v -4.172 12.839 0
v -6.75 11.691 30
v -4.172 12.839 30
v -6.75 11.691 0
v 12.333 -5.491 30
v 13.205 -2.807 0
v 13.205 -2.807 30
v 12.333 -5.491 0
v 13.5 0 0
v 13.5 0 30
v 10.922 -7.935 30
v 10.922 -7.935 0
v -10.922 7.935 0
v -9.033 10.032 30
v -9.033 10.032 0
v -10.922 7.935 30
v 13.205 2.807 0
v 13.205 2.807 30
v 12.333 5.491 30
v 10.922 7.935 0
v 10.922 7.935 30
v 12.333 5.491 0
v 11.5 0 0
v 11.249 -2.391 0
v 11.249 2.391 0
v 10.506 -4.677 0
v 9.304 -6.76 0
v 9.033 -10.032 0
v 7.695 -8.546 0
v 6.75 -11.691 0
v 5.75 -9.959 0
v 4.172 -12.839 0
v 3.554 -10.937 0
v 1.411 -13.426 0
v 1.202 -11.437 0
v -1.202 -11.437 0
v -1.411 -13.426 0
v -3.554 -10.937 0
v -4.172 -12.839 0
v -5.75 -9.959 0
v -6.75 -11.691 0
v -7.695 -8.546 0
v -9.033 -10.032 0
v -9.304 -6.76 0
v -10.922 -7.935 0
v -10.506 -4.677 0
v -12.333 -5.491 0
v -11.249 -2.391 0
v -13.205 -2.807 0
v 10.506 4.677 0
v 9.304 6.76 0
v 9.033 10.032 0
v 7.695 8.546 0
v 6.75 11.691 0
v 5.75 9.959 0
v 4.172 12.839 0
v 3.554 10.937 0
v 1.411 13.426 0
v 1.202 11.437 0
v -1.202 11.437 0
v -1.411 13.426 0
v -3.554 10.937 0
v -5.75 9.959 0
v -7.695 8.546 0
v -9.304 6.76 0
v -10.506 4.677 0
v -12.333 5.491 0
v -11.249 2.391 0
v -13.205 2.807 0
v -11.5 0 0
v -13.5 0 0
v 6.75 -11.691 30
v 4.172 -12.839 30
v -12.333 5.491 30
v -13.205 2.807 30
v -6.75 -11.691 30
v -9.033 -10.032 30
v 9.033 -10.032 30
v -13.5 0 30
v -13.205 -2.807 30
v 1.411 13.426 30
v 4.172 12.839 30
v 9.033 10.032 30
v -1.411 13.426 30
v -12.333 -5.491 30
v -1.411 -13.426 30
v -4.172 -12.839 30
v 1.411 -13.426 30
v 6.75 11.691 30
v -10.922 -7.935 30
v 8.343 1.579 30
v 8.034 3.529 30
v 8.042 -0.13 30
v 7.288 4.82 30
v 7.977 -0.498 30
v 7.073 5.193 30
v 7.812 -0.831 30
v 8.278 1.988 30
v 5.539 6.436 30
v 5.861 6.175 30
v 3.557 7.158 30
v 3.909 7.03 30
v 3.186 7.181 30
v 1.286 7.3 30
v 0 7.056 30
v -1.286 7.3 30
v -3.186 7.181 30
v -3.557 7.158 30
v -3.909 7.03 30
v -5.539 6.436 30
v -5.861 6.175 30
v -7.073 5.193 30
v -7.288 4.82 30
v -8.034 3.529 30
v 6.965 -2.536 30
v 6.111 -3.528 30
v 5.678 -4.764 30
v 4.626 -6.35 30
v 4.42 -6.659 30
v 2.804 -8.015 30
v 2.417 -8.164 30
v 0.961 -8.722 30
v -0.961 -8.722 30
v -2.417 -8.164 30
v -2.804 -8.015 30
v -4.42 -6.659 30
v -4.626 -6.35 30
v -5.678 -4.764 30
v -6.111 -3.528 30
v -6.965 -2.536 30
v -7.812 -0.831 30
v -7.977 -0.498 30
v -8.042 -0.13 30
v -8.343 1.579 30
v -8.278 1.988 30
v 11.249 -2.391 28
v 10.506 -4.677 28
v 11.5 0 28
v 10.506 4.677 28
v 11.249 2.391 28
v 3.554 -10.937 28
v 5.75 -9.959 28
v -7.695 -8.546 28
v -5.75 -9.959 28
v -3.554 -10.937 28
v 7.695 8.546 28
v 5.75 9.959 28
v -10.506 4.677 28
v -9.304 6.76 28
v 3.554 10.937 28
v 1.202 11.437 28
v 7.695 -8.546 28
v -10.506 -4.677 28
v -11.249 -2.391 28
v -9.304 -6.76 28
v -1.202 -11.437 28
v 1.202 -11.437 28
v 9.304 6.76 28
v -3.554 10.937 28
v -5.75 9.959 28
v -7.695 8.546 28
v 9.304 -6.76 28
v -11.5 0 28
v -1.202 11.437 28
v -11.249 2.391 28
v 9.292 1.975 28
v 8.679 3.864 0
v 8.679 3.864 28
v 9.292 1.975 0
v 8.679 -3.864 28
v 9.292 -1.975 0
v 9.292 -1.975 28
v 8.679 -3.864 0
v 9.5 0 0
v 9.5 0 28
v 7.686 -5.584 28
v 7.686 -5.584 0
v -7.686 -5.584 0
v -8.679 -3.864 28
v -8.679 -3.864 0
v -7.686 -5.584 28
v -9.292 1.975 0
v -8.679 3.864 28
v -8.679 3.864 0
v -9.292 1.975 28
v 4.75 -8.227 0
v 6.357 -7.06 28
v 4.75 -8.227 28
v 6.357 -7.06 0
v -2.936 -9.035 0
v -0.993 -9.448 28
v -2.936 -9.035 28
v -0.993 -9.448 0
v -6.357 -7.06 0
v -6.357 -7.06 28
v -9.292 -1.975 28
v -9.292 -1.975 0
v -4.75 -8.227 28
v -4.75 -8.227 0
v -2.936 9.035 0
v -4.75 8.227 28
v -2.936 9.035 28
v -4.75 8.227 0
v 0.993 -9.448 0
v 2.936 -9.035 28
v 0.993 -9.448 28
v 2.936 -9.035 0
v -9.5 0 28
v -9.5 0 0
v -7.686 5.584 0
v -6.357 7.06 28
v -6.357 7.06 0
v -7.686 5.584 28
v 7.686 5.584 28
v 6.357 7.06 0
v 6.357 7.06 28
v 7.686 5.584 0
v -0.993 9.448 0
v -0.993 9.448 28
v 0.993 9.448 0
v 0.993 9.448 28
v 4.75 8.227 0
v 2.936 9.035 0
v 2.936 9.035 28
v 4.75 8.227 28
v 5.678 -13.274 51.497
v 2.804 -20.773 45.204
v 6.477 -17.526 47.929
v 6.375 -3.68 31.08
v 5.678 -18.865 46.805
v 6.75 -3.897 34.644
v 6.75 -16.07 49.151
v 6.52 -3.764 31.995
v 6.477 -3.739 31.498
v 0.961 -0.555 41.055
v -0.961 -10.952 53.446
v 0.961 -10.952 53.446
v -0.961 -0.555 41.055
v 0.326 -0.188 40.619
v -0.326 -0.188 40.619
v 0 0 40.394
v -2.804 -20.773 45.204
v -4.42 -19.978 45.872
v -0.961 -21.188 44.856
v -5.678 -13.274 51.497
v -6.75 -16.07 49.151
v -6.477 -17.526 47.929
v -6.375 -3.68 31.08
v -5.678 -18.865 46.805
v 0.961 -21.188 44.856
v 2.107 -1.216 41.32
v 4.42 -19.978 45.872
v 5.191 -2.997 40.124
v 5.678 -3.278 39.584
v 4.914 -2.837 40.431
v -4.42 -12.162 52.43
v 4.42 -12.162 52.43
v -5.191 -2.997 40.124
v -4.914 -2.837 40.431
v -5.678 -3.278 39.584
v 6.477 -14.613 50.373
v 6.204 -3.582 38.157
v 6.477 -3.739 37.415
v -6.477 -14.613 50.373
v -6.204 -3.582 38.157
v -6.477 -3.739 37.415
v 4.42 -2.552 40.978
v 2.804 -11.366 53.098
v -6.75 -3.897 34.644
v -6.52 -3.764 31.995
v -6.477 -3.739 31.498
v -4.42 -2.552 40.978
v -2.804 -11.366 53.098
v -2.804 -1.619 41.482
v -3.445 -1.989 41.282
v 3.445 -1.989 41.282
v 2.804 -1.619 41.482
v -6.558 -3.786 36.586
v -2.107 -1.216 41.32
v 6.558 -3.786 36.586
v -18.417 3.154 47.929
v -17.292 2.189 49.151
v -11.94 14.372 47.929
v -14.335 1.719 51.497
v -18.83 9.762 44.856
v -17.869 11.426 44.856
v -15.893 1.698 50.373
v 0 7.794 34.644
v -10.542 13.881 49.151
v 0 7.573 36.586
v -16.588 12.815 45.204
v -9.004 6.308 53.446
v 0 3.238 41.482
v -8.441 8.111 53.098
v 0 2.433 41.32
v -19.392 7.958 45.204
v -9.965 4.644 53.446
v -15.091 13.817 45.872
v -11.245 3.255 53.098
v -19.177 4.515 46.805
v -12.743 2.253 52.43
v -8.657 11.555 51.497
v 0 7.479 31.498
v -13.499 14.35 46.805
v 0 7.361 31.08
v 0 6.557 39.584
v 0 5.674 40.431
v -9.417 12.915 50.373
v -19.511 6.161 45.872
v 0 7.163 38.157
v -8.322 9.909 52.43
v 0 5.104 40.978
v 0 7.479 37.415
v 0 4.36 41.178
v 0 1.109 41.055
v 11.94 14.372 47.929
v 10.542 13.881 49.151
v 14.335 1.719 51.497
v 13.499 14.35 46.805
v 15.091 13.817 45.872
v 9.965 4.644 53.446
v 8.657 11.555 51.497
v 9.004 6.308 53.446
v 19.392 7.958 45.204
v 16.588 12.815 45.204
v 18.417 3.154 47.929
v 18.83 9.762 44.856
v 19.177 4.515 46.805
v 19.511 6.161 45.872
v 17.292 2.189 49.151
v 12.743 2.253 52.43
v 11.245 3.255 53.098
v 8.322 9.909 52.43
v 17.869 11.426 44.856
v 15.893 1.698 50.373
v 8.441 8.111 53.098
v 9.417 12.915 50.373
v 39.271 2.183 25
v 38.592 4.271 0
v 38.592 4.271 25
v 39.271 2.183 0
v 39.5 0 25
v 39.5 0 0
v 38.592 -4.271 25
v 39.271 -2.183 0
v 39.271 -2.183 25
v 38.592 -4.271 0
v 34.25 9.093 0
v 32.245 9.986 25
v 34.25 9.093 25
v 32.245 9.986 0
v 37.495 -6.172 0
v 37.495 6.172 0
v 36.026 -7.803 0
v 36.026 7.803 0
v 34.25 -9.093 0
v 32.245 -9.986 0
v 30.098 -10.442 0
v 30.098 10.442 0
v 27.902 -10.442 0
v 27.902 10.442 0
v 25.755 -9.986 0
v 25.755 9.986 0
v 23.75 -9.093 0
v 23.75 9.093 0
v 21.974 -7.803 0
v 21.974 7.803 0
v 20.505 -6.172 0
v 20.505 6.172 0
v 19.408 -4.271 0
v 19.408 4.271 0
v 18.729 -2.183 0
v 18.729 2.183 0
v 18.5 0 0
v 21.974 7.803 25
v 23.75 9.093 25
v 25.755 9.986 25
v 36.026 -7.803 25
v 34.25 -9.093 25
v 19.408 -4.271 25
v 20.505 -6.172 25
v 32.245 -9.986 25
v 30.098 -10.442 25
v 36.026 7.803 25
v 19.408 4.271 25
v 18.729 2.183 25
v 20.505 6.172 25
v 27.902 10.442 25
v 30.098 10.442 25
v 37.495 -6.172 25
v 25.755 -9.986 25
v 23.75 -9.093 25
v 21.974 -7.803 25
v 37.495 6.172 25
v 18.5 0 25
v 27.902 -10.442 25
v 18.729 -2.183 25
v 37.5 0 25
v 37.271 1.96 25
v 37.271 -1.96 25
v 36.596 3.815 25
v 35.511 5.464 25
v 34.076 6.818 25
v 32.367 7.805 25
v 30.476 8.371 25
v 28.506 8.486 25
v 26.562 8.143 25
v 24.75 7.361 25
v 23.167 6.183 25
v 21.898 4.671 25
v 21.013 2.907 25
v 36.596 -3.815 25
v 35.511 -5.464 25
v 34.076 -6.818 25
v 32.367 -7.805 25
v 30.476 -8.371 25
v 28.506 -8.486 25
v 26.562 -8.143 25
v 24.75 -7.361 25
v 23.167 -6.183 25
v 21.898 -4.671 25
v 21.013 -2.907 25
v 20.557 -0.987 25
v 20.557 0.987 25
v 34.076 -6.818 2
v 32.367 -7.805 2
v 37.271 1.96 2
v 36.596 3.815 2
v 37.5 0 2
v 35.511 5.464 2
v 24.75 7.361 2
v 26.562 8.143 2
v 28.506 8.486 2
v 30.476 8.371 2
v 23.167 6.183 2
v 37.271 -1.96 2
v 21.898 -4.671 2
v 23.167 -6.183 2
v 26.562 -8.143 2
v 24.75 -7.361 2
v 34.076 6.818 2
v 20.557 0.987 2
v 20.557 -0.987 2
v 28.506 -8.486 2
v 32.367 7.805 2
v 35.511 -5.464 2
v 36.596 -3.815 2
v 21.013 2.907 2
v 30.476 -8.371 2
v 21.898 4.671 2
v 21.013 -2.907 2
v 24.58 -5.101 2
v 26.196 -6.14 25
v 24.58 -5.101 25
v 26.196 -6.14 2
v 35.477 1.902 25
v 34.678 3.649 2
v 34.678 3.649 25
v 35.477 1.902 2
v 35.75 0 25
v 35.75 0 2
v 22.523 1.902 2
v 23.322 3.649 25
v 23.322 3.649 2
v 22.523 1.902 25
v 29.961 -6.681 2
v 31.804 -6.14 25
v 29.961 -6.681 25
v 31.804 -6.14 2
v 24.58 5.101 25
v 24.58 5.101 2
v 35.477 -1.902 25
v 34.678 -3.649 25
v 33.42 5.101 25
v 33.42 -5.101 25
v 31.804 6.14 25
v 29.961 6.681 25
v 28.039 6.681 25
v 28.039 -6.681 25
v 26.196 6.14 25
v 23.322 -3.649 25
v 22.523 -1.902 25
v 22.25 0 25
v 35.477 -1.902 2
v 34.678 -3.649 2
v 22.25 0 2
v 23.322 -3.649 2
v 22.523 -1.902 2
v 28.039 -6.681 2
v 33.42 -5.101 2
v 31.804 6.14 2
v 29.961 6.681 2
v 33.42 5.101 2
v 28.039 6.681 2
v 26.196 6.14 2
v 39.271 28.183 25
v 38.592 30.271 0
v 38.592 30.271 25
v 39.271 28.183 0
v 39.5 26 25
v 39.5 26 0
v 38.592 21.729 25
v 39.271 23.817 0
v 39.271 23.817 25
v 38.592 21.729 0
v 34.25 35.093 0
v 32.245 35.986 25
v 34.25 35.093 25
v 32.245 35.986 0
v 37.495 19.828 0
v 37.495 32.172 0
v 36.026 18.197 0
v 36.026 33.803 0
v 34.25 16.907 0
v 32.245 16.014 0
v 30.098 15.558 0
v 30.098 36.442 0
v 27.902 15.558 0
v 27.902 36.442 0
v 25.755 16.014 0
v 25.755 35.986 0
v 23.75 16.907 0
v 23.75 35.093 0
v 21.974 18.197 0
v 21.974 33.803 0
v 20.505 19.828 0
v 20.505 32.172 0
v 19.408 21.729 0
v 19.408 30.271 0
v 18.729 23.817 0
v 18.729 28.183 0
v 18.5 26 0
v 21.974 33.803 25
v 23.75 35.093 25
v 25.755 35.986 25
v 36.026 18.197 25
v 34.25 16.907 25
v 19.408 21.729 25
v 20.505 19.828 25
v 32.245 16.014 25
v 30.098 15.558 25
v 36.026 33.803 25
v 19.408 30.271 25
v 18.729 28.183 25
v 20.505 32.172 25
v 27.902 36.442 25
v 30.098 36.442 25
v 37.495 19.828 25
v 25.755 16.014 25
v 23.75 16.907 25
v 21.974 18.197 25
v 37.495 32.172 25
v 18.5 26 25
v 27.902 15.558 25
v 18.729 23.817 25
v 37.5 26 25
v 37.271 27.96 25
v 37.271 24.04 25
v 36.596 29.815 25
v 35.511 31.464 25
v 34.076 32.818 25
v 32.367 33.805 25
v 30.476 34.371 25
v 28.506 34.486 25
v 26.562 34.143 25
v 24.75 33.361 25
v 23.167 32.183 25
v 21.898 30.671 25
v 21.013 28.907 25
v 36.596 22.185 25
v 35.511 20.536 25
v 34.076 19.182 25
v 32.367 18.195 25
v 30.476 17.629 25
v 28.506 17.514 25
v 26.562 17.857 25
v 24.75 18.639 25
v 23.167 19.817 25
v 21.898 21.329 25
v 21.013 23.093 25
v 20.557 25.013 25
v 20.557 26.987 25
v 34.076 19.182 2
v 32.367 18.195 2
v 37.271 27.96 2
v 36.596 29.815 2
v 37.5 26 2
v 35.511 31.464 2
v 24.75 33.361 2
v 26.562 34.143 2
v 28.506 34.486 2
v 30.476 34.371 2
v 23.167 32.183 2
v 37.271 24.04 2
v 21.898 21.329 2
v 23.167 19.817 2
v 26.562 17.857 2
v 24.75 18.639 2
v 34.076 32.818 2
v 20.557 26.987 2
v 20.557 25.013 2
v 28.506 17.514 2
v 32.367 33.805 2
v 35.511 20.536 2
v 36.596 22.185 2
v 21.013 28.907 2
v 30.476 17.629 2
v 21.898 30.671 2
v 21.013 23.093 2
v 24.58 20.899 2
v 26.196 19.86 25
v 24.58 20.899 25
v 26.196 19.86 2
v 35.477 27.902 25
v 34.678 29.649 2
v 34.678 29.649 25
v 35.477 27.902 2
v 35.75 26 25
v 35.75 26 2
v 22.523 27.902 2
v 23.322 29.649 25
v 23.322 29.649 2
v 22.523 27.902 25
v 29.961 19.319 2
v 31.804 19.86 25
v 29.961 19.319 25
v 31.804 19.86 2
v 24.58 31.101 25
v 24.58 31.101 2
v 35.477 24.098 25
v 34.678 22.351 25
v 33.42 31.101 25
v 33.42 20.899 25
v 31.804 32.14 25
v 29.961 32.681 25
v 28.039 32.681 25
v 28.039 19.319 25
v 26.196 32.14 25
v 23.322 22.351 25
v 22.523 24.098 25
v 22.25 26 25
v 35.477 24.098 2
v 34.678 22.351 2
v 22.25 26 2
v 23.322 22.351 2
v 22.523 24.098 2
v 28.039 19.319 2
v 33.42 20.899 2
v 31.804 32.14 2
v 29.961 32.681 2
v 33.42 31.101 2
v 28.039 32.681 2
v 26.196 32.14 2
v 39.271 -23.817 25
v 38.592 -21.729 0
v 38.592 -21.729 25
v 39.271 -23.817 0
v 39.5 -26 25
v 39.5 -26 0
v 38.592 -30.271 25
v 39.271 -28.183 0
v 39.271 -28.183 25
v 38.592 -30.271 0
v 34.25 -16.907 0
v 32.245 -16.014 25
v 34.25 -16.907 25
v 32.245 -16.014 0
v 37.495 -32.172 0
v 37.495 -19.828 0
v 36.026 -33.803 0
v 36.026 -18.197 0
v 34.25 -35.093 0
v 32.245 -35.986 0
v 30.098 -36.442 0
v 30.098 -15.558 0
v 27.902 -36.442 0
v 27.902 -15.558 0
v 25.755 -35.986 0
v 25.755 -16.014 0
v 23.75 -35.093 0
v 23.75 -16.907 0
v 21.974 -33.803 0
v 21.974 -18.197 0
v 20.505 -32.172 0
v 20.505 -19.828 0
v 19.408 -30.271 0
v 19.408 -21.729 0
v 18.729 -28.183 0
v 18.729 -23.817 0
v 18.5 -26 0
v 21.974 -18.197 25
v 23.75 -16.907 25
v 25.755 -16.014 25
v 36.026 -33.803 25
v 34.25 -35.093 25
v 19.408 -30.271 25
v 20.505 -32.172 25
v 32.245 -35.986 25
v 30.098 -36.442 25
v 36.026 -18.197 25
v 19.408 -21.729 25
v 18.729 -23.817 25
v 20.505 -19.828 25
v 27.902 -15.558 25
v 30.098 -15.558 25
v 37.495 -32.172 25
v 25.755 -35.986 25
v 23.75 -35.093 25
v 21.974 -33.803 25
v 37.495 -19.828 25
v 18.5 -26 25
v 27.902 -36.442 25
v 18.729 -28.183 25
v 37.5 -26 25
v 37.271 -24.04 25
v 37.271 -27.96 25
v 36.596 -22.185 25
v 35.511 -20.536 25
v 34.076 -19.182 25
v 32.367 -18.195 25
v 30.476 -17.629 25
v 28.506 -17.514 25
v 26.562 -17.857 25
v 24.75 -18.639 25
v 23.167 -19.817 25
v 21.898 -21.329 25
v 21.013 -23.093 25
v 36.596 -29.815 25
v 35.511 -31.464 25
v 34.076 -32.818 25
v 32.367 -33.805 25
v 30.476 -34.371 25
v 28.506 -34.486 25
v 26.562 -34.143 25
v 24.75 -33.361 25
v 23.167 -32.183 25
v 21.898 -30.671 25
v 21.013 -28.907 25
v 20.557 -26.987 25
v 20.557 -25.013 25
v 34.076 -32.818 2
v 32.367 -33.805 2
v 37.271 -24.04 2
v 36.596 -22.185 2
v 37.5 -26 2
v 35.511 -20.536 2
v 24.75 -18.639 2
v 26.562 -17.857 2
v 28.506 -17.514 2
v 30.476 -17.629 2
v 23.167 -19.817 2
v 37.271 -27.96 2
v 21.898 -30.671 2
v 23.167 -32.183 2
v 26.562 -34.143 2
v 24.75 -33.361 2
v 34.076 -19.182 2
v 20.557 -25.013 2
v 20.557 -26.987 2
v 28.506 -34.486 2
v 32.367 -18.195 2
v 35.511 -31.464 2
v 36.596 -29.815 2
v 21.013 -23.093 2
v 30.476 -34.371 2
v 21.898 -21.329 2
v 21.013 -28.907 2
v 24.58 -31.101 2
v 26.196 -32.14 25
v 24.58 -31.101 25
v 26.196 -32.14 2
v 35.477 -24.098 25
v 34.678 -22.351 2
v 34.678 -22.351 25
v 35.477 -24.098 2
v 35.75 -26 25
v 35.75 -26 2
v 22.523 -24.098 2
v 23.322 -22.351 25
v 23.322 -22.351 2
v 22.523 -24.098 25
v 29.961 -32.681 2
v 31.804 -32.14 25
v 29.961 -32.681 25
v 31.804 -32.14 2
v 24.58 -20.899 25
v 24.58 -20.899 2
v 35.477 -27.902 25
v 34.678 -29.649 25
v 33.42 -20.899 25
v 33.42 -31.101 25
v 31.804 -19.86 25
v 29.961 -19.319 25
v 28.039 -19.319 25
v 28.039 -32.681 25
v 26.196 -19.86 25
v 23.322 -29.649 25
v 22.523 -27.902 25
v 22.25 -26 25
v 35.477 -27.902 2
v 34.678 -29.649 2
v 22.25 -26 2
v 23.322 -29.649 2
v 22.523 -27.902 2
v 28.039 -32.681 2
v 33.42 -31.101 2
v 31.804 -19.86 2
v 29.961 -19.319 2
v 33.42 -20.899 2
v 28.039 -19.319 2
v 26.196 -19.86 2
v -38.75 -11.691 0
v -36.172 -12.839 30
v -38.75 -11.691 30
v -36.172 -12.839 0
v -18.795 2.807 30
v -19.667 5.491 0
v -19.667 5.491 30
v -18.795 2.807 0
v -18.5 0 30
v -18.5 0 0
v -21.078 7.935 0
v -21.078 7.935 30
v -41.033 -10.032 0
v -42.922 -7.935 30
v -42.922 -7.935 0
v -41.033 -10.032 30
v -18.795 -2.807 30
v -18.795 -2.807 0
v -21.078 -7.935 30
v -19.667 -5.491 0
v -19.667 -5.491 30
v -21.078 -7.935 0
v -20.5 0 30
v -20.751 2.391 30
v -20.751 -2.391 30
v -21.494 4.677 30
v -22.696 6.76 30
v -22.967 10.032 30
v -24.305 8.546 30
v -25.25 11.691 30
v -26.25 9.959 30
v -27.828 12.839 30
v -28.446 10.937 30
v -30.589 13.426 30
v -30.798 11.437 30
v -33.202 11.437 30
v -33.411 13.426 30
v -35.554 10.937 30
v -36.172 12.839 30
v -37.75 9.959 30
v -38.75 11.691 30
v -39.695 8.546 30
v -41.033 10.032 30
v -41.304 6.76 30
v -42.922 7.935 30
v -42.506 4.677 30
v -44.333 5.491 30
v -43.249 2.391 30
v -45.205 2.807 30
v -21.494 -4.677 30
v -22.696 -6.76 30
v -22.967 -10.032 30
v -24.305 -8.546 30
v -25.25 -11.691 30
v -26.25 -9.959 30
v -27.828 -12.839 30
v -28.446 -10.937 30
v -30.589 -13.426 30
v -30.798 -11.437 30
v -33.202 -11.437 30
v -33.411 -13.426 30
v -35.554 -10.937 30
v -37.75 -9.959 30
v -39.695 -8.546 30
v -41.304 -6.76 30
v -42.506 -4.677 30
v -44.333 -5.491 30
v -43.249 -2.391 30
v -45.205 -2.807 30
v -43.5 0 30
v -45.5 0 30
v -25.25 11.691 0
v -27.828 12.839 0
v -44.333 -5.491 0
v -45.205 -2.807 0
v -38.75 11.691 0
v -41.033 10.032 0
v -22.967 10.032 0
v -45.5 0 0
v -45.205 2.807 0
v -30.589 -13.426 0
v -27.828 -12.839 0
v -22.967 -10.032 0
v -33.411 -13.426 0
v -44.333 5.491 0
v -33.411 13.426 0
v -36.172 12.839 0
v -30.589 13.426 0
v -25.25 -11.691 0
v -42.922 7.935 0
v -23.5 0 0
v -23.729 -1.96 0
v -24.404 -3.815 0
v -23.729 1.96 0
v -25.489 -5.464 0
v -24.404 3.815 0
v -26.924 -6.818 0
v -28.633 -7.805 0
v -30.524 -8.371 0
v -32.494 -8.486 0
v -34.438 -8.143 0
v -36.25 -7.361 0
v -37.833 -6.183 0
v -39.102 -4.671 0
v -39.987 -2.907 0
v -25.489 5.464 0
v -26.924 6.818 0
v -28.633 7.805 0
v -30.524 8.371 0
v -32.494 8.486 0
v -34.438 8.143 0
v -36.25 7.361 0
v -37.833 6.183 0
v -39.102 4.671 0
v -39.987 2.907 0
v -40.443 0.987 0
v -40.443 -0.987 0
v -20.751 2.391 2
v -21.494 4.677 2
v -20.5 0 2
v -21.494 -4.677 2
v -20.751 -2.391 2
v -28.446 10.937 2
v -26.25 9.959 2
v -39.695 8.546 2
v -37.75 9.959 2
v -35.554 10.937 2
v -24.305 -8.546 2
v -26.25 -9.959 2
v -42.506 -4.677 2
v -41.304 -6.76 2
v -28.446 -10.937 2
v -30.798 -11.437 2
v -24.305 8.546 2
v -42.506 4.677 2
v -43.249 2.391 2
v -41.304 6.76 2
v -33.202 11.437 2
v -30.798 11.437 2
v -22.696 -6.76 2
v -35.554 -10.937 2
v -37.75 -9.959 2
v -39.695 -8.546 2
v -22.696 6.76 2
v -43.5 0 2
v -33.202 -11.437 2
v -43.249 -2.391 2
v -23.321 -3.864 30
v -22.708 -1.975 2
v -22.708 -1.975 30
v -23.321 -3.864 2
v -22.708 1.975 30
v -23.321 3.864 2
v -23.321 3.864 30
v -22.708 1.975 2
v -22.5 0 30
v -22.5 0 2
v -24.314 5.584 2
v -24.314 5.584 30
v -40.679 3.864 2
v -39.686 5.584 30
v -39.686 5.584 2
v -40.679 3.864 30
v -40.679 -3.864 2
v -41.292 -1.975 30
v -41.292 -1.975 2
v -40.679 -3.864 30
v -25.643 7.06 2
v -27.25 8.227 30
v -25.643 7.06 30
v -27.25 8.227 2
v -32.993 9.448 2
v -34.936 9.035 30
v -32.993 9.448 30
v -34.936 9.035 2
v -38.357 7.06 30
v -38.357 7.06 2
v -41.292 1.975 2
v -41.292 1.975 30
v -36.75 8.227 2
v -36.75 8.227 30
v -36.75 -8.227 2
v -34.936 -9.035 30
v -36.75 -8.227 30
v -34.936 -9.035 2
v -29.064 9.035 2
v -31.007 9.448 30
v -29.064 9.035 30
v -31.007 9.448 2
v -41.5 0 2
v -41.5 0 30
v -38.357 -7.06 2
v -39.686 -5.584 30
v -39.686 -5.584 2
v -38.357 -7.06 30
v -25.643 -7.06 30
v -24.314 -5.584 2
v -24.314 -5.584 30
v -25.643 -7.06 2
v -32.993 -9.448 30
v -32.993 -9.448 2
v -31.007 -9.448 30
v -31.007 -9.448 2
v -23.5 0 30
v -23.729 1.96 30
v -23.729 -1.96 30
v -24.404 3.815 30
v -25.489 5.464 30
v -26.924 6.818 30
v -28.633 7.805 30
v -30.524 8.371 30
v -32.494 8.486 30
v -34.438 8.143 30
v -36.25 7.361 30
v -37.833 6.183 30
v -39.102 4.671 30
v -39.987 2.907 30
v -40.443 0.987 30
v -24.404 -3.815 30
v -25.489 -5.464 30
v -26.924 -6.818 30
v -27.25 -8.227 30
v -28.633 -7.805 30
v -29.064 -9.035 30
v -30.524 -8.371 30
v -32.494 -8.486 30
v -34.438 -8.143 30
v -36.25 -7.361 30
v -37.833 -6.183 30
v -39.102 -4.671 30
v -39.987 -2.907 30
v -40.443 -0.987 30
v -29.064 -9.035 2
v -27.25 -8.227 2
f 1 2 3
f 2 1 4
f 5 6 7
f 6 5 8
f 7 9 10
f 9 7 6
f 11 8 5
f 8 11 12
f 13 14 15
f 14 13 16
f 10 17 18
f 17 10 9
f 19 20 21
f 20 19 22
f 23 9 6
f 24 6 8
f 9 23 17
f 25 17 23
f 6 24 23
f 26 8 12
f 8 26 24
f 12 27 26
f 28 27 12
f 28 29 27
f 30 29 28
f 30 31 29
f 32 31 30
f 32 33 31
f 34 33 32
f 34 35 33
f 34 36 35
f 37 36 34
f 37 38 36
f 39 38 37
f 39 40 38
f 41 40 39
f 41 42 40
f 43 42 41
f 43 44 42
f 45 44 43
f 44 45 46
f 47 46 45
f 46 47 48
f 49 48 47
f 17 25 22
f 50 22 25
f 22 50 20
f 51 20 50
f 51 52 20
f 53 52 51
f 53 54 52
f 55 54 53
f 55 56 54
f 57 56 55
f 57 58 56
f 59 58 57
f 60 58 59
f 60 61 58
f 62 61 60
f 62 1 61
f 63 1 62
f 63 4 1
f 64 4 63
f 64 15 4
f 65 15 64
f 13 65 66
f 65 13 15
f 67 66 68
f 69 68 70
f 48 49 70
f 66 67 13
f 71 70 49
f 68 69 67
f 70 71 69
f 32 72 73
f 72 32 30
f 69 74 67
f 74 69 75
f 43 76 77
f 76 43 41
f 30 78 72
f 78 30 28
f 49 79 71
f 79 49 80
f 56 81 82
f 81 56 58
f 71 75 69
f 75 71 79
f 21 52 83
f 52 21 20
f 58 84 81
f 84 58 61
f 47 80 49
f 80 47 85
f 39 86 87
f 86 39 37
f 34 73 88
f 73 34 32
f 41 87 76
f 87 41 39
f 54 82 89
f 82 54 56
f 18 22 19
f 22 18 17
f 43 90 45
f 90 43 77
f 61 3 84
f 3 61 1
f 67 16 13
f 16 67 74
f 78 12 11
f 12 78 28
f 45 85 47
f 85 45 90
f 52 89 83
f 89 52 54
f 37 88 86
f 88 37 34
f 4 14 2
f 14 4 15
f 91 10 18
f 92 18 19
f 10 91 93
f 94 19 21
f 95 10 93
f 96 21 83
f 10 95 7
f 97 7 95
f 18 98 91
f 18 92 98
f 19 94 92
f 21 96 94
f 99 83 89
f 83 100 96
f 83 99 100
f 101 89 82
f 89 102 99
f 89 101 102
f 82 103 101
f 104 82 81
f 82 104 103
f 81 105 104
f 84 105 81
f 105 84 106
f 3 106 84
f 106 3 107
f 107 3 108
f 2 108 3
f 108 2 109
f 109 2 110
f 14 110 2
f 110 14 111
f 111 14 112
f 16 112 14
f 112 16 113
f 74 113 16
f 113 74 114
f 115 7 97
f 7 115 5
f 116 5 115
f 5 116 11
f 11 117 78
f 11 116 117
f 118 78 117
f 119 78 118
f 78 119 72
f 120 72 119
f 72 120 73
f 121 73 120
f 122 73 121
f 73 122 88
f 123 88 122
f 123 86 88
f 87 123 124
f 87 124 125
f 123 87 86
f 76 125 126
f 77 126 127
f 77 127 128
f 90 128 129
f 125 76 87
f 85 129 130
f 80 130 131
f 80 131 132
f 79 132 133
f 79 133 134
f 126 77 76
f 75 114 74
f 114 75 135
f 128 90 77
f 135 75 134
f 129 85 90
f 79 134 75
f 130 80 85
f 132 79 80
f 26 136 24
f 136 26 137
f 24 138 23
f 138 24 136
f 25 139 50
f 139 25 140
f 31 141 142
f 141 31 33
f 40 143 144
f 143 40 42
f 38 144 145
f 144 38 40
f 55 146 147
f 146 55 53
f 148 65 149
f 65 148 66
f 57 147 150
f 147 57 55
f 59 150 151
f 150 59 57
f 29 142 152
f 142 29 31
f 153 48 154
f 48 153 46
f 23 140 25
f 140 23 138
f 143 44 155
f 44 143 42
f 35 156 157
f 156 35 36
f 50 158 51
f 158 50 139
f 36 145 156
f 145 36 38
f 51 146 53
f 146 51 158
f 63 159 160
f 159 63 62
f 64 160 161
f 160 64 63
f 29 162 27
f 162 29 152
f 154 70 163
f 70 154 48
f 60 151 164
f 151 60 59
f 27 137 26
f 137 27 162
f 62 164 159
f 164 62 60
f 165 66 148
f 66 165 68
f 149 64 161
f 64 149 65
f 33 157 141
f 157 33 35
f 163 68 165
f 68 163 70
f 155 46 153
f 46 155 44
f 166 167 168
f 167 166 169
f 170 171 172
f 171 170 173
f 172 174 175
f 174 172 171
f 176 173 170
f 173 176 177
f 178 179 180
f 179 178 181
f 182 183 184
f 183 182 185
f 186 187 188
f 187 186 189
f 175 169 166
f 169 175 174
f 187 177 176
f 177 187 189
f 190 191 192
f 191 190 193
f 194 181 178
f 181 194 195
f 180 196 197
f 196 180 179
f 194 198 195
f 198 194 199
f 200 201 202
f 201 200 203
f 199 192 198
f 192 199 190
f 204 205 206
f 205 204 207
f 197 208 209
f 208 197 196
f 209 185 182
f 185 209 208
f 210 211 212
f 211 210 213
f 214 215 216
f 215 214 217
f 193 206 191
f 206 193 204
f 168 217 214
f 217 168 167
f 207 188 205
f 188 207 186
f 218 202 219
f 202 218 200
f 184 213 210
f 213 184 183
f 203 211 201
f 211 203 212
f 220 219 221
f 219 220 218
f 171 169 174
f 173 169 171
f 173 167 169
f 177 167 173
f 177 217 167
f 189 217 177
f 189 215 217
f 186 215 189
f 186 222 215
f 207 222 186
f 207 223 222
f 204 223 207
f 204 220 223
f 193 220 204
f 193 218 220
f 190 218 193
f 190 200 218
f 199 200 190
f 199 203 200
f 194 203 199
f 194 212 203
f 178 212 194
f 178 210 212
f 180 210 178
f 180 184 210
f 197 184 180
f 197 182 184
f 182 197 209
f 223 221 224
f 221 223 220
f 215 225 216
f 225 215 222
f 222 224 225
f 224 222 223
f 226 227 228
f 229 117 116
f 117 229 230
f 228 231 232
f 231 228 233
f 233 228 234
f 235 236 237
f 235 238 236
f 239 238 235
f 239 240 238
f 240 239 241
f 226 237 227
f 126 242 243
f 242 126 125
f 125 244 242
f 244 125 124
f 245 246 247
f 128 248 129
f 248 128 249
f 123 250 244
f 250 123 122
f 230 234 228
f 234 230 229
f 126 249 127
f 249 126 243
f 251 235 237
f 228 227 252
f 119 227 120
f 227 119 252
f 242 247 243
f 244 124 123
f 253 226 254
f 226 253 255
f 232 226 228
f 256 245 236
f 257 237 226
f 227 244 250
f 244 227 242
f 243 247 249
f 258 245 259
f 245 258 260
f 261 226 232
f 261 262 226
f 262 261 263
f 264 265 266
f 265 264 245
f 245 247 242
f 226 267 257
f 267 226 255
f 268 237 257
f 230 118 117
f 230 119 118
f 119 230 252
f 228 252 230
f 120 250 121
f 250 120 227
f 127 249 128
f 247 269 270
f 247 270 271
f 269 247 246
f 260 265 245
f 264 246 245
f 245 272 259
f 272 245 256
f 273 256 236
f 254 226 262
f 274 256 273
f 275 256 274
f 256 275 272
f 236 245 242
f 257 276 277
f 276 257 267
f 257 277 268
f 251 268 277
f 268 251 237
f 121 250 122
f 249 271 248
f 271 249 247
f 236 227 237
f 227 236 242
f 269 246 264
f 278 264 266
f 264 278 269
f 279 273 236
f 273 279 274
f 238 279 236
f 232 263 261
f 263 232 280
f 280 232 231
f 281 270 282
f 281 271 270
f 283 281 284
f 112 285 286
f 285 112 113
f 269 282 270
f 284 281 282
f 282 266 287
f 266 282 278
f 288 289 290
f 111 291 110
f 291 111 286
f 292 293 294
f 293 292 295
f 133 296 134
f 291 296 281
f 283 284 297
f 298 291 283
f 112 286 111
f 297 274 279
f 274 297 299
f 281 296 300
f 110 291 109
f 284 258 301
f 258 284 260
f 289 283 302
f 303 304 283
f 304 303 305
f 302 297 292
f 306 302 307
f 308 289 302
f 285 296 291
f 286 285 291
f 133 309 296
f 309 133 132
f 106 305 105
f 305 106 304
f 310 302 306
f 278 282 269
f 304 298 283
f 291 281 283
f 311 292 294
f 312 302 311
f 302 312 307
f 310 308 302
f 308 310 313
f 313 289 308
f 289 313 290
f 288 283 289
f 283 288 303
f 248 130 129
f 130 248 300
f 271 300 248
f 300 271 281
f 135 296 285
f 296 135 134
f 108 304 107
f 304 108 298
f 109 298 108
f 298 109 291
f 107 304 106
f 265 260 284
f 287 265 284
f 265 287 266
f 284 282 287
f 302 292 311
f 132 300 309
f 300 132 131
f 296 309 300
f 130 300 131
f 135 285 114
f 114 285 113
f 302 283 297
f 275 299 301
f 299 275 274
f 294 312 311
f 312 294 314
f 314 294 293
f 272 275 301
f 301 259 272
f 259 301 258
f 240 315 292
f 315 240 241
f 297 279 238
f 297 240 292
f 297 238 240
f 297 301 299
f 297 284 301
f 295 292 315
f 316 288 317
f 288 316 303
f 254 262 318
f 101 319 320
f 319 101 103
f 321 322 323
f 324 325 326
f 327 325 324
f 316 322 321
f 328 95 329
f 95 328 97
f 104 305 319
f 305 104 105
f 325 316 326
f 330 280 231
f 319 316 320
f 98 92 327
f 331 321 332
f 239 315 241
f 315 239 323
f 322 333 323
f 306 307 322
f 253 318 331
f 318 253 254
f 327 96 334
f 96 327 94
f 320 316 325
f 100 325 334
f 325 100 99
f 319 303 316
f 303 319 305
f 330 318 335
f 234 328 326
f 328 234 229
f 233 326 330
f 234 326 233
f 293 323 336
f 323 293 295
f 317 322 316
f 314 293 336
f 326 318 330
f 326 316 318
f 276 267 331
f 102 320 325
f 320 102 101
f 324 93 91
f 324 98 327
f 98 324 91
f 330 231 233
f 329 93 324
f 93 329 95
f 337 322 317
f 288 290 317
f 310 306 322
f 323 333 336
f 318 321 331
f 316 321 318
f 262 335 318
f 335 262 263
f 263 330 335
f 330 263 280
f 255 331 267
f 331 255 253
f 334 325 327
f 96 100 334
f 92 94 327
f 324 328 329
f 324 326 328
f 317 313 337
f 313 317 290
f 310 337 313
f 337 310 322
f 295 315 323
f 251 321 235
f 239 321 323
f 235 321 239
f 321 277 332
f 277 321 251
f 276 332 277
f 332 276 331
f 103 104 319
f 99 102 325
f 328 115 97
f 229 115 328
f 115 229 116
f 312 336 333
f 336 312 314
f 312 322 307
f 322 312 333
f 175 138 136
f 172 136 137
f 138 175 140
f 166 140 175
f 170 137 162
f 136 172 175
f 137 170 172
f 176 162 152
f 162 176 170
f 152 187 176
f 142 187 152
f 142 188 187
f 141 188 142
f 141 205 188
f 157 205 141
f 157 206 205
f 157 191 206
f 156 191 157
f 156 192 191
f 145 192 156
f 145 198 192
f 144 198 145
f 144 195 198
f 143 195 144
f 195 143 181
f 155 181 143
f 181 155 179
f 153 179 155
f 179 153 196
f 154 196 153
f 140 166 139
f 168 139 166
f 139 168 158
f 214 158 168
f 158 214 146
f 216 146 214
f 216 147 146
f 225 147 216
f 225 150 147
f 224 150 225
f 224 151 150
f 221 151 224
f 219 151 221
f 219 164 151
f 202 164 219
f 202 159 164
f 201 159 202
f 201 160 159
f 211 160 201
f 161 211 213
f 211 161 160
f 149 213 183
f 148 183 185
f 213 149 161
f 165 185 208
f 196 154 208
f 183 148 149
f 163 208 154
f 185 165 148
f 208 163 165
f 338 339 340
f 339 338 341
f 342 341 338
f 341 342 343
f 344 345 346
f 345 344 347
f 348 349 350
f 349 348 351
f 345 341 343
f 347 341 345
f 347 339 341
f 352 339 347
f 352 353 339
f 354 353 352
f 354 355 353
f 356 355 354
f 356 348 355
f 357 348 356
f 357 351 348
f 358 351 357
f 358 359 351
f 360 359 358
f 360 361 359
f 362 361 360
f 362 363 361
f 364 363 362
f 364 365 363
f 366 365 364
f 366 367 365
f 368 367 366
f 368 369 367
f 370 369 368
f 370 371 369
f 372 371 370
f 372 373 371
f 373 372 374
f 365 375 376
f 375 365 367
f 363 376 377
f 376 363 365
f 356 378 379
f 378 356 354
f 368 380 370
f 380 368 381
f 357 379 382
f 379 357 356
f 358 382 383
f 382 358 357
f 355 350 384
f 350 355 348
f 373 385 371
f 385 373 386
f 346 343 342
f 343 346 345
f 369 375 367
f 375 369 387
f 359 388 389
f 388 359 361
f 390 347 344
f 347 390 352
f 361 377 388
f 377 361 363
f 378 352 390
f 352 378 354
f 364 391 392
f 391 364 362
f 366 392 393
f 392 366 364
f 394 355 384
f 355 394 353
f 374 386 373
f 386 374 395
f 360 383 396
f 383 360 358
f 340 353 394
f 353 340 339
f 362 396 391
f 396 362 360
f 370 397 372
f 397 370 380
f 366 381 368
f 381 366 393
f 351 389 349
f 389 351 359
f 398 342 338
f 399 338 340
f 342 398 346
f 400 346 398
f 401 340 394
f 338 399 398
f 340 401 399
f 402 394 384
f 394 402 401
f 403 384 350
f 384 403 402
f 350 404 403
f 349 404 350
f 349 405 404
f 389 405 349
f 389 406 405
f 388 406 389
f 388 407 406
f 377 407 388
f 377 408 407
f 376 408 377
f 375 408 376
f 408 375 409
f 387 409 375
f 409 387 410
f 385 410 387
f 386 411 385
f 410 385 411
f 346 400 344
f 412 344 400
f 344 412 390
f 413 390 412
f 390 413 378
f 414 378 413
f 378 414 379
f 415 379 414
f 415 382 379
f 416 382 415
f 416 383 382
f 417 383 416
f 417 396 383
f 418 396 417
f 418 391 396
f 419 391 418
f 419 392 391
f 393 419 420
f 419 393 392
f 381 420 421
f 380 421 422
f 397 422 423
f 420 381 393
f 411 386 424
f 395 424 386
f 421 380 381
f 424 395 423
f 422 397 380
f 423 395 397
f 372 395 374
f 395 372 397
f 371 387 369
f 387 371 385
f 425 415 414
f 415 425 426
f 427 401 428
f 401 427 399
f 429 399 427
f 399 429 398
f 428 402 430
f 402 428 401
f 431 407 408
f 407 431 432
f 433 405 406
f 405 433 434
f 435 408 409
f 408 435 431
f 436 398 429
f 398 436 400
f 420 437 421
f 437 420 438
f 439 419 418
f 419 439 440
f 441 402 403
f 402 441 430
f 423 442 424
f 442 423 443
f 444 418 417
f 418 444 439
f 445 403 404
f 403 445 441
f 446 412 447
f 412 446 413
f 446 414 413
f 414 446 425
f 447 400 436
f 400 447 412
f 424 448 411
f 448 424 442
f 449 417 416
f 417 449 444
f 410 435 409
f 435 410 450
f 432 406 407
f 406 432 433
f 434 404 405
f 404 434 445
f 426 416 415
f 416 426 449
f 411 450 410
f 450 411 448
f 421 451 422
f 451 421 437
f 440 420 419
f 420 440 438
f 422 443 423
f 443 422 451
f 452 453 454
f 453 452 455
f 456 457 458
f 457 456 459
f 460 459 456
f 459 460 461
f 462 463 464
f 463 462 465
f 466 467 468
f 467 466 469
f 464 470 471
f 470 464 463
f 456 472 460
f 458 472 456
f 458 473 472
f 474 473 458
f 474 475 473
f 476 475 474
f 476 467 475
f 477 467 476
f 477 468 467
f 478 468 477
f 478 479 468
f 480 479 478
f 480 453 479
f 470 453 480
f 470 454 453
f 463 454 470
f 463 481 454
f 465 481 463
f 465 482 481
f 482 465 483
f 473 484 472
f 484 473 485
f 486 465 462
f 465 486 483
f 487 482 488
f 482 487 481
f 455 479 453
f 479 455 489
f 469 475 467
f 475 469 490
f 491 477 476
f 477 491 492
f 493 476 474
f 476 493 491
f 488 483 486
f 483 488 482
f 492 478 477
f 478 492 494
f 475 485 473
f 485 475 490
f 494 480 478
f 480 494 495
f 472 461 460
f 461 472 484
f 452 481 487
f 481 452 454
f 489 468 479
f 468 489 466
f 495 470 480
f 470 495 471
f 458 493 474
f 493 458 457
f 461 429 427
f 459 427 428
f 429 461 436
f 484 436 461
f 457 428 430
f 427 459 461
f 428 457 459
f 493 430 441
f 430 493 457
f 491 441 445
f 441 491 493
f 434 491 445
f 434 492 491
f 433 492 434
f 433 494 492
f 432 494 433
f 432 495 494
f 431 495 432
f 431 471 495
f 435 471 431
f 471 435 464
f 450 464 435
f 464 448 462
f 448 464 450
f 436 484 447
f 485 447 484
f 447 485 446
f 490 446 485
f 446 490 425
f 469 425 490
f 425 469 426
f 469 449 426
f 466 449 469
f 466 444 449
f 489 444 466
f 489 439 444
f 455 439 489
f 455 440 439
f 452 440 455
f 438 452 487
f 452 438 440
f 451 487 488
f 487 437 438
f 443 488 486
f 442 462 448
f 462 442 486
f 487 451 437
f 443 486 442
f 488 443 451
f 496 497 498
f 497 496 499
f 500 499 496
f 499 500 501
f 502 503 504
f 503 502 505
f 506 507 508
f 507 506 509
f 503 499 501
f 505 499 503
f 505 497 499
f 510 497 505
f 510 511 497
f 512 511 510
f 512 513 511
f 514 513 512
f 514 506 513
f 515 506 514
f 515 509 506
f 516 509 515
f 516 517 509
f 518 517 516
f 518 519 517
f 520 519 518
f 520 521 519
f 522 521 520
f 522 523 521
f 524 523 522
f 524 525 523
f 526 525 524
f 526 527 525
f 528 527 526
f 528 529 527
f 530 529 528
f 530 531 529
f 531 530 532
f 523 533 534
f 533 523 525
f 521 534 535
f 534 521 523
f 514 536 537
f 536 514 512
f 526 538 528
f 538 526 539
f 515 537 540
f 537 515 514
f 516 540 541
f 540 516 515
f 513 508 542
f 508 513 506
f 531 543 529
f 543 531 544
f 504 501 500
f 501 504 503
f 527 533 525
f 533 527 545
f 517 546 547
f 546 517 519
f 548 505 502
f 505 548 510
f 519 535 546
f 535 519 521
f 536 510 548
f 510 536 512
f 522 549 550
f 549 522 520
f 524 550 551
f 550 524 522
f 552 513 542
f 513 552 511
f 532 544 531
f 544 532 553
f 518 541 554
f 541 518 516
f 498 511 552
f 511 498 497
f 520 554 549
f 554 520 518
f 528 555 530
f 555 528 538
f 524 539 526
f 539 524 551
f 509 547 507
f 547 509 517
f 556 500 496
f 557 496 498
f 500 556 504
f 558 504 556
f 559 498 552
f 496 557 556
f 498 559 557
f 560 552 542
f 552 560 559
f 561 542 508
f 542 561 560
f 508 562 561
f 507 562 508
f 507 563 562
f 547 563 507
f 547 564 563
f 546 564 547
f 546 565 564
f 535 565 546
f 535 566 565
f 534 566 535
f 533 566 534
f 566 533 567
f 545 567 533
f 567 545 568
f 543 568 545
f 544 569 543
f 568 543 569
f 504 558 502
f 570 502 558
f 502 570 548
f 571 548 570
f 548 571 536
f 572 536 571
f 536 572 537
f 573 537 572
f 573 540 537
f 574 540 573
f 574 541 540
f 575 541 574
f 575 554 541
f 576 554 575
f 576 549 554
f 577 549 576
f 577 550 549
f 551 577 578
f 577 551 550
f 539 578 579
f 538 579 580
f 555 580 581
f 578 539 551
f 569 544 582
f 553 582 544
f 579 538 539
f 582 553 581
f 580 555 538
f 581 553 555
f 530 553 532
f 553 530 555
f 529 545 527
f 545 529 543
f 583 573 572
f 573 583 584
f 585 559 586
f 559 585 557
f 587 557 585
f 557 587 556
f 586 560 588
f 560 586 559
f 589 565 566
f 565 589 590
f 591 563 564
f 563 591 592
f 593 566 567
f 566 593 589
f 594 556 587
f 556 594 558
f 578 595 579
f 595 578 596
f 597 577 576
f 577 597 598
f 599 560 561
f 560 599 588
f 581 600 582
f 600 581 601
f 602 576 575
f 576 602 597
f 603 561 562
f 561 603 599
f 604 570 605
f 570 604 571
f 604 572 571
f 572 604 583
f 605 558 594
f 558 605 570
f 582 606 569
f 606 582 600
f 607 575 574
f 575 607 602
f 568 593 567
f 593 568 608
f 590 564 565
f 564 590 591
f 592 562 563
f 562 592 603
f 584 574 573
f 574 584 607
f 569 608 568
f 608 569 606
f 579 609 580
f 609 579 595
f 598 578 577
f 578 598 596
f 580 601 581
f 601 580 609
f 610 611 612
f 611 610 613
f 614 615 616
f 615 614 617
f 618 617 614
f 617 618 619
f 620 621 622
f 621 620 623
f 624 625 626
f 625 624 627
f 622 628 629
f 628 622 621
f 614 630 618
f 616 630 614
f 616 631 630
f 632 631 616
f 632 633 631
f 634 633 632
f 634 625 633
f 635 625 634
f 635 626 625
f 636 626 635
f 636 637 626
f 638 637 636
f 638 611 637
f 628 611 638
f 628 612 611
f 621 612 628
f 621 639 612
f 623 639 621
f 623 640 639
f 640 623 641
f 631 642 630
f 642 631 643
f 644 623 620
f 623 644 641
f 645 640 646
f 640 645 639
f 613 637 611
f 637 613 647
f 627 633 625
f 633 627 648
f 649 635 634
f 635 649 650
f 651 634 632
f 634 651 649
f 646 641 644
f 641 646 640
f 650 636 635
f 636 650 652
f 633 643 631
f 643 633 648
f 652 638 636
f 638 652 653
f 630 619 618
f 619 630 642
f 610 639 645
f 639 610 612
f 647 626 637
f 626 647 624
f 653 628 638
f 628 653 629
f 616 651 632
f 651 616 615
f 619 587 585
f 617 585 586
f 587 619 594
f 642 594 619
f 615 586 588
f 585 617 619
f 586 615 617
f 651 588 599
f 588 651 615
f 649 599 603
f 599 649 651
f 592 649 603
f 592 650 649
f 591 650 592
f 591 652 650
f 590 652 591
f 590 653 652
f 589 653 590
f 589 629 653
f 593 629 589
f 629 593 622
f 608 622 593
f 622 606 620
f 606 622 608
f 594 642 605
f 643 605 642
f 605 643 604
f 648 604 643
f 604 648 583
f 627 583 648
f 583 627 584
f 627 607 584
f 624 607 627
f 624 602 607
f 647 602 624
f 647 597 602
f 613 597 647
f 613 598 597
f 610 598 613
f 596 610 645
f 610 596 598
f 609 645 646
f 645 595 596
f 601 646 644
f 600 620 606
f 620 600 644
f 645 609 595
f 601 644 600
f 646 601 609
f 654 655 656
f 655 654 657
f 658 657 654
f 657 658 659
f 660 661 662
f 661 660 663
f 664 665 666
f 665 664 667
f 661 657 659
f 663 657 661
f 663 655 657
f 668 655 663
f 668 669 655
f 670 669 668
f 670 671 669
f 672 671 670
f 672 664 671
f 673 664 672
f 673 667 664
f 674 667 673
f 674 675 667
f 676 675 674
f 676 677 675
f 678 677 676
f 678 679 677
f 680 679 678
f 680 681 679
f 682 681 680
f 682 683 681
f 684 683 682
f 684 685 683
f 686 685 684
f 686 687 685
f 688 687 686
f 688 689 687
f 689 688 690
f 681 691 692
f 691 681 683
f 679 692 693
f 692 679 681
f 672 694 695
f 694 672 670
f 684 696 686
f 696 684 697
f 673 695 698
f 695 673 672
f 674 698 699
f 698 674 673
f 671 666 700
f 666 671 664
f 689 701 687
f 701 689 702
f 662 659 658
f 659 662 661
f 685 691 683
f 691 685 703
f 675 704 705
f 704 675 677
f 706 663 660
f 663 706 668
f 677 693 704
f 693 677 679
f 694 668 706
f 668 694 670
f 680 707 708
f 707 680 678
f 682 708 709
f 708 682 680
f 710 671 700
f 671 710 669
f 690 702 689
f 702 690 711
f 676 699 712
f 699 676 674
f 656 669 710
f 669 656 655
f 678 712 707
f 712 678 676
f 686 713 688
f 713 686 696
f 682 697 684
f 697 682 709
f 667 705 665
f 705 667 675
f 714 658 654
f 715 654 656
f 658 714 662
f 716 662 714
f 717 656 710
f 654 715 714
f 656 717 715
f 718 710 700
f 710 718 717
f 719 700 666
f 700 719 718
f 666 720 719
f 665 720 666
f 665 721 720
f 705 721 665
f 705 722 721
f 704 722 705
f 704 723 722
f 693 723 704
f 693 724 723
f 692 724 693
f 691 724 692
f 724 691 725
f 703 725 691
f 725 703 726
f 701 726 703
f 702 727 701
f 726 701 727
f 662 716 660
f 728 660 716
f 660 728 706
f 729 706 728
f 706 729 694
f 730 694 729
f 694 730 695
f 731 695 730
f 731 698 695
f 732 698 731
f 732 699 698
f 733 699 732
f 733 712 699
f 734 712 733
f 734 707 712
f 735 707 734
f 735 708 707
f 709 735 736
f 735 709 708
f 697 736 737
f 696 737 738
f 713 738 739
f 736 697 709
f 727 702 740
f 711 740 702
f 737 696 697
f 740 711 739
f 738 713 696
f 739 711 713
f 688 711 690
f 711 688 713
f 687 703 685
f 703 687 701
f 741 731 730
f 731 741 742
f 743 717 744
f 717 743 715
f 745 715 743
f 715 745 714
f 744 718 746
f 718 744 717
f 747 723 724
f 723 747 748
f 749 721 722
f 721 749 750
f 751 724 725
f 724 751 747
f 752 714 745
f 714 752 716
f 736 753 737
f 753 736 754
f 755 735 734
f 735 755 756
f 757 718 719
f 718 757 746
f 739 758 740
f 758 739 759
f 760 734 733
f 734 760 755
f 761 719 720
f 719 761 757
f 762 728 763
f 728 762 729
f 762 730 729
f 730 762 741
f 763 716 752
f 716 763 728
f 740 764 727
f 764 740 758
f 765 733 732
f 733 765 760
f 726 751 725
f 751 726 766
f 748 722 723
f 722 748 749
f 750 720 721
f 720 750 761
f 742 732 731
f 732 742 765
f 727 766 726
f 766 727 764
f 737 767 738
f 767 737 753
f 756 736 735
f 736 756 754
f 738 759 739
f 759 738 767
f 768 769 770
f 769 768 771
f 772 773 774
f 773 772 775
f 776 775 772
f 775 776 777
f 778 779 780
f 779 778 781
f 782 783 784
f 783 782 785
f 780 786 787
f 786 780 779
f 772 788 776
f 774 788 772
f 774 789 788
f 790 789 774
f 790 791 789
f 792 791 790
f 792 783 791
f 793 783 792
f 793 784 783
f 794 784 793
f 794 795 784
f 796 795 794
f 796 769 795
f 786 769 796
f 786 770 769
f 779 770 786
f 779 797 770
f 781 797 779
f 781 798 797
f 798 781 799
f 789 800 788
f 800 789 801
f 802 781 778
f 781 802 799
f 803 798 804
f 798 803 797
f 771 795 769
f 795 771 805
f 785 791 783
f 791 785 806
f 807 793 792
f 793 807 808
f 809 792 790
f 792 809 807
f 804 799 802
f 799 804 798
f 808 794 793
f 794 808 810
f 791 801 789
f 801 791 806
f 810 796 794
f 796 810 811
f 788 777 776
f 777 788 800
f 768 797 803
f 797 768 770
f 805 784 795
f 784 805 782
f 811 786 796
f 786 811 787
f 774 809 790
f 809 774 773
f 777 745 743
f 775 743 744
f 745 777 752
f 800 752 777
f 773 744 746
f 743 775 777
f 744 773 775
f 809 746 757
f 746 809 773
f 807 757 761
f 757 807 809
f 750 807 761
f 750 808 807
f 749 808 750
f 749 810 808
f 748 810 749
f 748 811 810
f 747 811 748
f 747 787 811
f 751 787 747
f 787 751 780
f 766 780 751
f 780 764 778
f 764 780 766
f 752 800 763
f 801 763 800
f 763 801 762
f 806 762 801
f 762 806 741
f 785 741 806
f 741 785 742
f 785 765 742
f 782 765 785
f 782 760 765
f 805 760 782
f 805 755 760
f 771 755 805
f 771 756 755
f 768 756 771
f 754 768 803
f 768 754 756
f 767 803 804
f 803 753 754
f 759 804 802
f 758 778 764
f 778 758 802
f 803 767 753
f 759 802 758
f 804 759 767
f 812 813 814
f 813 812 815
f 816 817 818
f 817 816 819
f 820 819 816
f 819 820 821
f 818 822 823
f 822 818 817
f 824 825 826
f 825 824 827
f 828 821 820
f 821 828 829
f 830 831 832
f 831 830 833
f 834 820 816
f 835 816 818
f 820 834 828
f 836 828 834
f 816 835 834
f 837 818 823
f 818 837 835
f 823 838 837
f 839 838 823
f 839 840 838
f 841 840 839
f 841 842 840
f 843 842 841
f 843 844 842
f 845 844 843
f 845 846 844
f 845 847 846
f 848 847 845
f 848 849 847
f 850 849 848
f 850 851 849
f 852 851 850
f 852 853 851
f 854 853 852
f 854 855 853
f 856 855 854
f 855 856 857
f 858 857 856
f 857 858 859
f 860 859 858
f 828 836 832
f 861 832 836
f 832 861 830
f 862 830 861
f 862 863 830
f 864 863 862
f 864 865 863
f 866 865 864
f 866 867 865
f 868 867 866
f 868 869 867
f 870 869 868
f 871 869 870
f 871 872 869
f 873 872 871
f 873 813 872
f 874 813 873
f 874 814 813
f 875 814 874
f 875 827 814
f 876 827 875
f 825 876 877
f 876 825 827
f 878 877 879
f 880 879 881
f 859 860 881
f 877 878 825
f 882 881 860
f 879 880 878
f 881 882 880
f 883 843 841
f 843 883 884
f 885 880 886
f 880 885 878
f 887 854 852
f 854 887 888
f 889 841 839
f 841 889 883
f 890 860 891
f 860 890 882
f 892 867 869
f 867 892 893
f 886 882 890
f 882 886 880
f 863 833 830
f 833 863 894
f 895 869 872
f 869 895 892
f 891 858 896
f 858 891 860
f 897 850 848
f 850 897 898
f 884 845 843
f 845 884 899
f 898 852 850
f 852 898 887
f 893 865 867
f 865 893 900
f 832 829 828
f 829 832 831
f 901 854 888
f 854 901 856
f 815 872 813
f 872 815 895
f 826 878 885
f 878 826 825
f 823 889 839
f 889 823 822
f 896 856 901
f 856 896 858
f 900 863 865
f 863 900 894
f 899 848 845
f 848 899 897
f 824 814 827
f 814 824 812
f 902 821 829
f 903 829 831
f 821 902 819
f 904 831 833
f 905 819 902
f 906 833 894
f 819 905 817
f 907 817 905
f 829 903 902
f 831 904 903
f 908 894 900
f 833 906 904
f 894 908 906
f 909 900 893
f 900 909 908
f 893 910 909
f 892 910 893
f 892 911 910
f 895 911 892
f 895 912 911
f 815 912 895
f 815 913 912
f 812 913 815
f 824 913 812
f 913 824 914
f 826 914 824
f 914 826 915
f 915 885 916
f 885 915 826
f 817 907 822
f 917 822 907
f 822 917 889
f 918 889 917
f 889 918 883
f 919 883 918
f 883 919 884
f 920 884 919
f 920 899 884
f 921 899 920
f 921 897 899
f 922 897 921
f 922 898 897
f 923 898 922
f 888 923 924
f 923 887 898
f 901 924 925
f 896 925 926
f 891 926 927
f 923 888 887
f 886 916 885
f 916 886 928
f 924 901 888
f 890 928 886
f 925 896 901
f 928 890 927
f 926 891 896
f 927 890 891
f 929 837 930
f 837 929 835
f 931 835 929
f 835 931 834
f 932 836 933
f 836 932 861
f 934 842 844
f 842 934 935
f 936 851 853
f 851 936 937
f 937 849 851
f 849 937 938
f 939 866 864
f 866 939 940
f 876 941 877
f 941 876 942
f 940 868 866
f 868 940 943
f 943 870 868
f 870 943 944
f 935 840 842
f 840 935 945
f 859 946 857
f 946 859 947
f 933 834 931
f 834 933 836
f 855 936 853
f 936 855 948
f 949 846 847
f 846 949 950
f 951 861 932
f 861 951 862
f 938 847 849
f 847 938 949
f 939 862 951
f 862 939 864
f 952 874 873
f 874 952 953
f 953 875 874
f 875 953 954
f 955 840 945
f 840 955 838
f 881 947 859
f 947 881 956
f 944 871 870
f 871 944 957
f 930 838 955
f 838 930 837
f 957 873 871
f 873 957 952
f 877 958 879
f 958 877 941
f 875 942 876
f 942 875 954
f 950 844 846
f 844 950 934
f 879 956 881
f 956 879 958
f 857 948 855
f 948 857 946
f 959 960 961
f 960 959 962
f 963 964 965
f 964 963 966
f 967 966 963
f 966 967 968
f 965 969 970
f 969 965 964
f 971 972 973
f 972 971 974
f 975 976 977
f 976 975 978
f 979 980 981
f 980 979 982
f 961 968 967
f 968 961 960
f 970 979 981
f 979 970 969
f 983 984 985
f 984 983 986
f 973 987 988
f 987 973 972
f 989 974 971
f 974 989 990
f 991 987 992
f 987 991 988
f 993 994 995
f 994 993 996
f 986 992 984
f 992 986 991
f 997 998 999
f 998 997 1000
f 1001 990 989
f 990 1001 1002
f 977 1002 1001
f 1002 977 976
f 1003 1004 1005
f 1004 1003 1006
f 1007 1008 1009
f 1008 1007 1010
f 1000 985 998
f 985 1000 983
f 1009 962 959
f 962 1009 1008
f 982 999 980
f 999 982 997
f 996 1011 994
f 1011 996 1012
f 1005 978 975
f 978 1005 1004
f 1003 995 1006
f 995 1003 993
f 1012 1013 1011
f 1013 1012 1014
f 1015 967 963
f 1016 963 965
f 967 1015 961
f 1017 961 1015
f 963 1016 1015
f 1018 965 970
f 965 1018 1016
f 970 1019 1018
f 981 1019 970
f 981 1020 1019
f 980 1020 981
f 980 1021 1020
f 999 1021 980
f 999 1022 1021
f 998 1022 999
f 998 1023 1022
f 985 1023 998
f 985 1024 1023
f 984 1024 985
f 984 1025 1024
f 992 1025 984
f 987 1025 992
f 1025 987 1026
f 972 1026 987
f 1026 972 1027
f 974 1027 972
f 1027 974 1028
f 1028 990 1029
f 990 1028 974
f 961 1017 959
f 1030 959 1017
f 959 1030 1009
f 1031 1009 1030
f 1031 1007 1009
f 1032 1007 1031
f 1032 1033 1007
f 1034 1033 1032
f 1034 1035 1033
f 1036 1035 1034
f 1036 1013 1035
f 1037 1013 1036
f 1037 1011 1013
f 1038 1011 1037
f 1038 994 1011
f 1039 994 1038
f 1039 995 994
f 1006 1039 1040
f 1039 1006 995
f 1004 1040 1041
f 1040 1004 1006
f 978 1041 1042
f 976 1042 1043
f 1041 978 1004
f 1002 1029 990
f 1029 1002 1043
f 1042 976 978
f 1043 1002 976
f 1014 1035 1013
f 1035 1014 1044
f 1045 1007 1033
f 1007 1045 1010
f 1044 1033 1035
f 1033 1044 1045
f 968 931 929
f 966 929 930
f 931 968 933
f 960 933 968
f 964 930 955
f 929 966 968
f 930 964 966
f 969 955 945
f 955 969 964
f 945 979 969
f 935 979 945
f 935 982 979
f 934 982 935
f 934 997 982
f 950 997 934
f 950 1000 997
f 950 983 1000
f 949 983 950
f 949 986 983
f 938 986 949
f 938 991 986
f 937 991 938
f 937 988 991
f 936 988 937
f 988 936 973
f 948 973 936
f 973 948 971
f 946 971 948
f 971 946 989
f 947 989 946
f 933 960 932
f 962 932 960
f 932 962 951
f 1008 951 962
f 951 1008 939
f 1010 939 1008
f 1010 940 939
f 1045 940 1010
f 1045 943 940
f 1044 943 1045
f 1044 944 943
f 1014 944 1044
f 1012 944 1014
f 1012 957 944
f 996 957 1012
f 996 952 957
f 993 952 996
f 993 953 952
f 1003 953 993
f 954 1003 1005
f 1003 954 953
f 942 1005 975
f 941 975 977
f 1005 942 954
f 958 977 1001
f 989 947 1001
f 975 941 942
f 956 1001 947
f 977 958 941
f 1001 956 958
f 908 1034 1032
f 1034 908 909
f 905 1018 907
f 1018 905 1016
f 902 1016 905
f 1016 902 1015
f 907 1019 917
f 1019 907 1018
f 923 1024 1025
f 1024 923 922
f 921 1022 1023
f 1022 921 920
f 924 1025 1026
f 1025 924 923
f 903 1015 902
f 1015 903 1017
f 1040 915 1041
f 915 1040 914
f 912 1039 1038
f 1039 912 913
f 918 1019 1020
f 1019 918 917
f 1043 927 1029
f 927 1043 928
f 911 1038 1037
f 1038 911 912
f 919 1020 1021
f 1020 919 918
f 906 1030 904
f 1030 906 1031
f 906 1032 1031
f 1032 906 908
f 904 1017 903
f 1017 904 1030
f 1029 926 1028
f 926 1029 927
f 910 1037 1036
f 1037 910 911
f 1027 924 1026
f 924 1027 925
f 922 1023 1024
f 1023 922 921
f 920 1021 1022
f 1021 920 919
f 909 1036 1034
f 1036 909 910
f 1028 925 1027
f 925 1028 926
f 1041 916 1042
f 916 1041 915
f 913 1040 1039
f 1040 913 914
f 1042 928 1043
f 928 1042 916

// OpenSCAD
//Inner diameter of smaller tube
id1 = 13.5;
//Outer diameter of smaller tube (must be larger than id1
od1 = 17;
//Inner diameter of larger tube (must be larger than od1
id2 = 19;
//Outer diameter of larger tube (must be larger than id2)
od2 = 23;
//Height of smaller tube interface
h1 = 25; 
//Height of larger tube interface
h2 = 30;
//Angle of legs
ang = 40;
//Thickness of outer walls of part
thickness = 2;


ir1 = id1/2;
or1 = od1/2;
ir2 = id2/2;
or2 = od2/2;

rotate(180,[1,0,0])translate([0,0,-h2]){
	rotate(ang, [1,0,0])translate([0,0,-h1/2])cylinder(r=ir1, h=h1,center=true);
	rotate(120)rotate(ang, [1,0,0])translate([0,0,-h1/2])cylinder(r=ir1, h=h1,center=true);
	rotate(240)rotate(ang, [1,0,0])translate([0,0,-h1/2])cylinder(r=ir1, h=h1,center=true);
	translate([0,0,thickness/2])cylinder(r=or2, h=thickness,center=true);
	translate([0,0,h2/2]){
		cylinder(r=ir2, h=h2,center=true);	
	   difference(){
			cylinder(r=or2+thickness, h=h2,center=true);
			cylinder(r=or2, h=h2+1,center=true);		
		}
	}
}

module endcap(){

	translate([0,0,thickness/2])cylinder(r=or1, h=thickness,center=true);
	translate([0,0,h1/2]){
		cylinder(r=ir1, h=h1,center=true);
   		difference(){
			cylinder(r=or1+thickness, h=h1,center=true);
			cylinder(r=or1, h=h1+1,center=true);
		
		}
	}

}
translate([or2+or1+thickness*2+5,0,0])endcap();
translate([or2+or1+thickness*2+5,or1*2+thickness*2+5,0])endcap();
translate([or2+or1+thickness*2+5,-or1*2-thickness*2-5,0])endcap();


translate([-or2*2-thickness*2-5,0,0]){
difference(){
	union(){
		translate([0,0,thickness/2])cylinder(r=or2, h=thickness,center=true);
		translate([0,0,h2/2]){
			cylinder(r=ir2, h=h2,center=true);
   			difference(){
				cylinder(r=or2+thickness, h=h2,center=true);
				cylinder(r=or2, h=h2+1,center=true);	
			}
		}
	}
	translate([0,0,h2/2])cylinder(r=or1, h=h2+1,center=true);
	}
}
